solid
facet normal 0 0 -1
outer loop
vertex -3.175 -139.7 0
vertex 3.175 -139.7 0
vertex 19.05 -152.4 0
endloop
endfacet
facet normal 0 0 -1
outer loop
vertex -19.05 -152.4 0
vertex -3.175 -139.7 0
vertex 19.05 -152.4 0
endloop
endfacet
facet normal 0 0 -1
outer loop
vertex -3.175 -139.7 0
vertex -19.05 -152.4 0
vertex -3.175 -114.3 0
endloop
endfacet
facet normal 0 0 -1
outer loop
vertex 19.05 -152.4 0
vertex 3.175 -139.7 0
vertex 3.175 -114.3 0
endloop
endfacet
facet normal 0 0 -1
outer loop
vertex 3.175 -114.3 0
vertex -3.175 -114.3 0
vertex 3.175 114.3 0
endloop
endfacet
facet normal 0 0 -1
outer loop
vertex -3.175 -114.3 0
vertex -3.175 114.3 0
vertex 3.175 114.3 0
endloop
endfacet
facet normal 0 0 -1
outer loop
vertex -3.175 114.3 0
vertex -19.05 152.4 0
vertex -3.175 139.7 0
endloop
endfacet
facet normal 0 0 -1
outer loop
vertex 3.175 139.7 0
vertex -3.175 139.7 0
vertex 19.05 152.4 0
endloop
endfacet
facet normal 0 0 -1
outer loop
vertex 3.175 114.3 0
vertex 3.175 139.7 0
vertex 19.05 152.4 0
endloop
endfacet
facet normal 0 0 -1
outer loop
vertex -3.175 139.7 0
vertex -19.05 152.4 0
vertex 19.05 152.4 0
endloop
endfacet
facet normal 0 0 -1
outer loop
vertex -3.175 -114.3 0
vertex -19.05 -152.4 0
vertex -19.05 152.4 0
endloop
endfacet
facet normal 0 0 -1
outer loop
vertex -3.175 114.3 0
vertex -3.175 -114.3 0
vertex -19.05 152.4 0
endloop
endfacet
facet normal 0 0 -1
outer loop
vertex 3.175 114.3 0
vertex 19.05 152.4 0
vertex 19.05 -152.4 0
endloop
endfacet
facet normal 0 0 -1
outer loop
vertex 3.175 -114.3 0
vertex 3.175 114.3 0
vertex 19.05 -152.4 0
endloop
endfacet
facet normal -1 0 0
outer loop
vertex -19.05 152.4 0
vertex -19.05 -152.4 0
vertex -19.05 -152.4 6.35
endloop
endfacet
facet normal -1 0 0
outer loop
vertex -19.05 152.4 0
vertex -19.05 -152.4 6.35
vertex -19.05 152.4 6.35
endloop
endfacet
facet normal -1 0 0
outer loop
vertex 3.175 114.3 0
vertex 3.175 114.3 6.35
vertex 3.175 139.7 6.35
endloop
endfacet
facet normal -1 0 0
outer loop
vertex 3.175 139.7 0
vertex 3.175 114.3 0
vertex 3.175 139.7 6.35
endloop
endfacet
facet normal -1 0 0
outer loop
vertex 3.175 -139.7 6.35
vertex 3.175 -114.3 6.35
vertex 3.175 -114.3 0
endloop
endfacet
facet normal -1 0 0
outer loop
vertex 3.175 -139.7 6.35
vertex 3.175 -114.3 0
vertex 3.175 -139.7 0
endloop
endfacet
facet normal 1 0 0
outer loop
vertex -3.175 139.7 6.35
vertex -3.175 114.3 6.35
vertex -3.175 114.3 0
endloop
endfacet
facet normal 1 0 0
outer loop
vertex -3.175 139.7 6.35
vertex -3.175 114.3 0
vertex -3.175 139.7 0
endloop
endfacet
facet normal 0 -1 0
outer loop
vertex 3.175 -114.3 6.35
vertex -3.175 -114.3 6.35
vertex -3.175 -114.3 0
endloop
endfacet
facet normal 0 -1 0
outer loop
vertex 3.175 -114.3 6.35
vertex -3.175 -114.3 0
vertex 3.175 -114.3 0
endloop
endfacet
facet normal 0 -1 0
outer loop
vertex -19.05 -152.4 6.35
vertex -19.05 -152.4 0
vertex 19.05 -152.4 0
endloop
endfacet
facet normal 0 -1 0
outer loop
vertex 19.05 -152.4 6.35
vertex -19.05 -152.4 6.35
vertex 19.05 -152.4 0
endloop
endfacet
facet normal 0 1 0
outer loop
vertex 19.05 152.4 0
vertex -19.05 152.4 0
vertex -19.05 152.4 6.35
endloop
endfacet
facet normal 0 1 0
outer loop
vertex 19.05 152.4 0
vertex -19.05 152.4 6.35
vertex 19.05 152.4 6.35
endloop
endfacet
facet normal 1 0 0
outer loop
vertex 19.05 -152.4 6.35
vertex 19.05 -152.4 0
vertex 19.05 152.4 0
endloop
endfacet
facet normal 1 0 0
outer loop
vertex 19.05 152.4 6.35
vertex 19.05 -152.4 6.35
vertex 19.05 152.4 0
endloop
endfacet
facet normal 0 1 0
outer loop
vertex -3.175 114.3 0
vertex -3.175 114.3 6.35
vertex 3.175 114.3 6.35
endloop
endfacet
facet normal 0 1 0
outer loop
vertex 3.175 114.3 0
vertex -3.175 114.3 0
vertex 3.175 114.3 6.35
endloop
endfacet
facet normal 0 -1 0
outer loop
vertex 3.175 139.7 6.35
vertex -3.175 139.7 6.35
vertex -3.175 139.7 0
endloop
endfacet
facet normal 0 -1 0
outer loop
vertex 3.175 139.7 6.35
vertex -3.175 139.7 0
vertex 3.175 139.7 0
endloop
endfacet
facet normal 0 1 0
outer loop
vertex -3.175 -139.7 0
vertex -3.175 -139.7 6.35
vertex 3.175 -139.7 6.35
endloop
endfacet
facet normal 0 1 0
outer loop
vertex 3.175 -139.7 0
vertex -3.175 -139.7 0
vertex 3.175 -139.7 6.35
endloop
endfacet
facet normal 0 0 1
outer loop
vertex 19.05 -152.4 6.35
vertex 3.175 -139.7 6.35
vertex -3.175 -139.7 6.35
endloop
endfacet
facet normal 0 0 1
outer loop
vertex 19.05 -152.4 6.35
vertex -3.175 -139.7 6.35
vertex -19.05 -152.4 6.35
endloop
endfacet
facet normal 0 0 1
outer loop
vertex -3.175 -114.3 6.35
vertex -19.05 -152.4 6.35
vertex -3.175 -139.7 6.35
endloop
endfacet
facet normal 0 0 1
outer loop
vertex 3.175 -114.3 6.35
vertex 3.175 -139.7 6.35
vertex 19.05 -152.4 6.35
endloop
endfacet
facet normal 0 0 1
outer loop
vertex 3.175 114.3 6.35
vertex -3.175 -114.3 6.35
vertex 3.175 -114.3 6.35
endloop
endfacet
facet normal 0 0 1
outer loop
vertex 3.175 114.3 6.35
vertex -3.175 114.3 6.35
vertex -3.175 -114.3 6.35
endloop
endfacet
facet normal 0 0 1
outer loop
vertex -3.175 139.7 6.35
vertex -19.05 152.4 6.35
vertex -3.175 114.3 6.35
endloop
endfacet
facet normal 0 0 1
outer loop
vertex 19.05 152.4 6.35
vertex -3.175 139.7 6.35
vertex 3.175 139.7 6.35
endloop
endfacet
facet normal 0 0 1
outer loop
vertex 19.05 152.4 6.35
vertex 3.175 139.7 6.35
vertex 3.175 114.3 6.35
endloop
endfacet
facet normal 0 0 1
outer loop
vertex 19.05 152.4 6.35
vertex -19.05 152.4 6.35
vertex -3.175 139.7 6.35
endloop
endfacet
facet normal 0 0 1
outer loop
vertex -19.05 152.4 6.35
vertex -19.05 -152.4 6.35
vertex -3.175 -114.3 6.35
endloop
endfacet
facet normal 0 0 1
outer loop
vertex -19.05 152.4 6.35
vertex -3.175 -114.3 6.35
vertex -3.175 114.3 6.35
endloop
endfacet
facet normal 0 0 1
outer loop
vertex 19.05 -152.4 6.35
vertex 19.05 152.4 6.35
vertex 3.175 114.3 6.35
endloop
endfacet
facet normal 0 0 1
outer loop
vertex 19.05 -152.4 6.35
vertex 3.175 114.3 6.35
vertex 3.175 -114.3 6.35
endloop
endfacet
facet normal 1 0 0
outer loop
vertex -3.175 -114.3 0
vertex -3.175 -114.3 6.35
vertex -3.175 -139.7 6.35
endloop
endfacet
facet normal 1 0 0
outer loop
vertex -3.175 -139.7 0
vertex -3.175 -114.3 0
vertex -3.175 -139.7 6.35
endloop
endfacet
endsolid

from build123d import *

# Parameters (mm, degrees)
SKETCH1_W           = 38.1
SKETCH1_H           = 304.8
BOSS_EXTRUDE1_DEPTH = 6.35
SKETCH2_W           = 6.35
SKETCH2_H           = 25.4
CUT_EXTRUDE1_DEPTH  = 7.35


with BuildPart() as part:
    # Sketch1 → Boss-Extrude1 (new body)
    with BuildSketch(Plane.XY):
        Rectangle(SKETCH1_W, SKETCH1_H)
    extrude(amount=BOSS_EXTRUDE1_DEPTH)

    # Sketch2 → Cut-Extrude1 (cut, through all)
    with BuildSketch(Plane.XY.offset(6.35)):
        with Locations((0, 127)):
            Rectangle(SKETCH2_W, SKETCH2_H)
    cut_extrude1 = extrude(amount=-CUT_EXTRUDE1_DEPTH, mode=Mode.SUBTRACT)

    # Mirror1: Cut-Extrude1 across plane
    add(cut_extrude1.mirror(Plane.ZX), mode=Mode.SUBTRACT)


solid = part.part
